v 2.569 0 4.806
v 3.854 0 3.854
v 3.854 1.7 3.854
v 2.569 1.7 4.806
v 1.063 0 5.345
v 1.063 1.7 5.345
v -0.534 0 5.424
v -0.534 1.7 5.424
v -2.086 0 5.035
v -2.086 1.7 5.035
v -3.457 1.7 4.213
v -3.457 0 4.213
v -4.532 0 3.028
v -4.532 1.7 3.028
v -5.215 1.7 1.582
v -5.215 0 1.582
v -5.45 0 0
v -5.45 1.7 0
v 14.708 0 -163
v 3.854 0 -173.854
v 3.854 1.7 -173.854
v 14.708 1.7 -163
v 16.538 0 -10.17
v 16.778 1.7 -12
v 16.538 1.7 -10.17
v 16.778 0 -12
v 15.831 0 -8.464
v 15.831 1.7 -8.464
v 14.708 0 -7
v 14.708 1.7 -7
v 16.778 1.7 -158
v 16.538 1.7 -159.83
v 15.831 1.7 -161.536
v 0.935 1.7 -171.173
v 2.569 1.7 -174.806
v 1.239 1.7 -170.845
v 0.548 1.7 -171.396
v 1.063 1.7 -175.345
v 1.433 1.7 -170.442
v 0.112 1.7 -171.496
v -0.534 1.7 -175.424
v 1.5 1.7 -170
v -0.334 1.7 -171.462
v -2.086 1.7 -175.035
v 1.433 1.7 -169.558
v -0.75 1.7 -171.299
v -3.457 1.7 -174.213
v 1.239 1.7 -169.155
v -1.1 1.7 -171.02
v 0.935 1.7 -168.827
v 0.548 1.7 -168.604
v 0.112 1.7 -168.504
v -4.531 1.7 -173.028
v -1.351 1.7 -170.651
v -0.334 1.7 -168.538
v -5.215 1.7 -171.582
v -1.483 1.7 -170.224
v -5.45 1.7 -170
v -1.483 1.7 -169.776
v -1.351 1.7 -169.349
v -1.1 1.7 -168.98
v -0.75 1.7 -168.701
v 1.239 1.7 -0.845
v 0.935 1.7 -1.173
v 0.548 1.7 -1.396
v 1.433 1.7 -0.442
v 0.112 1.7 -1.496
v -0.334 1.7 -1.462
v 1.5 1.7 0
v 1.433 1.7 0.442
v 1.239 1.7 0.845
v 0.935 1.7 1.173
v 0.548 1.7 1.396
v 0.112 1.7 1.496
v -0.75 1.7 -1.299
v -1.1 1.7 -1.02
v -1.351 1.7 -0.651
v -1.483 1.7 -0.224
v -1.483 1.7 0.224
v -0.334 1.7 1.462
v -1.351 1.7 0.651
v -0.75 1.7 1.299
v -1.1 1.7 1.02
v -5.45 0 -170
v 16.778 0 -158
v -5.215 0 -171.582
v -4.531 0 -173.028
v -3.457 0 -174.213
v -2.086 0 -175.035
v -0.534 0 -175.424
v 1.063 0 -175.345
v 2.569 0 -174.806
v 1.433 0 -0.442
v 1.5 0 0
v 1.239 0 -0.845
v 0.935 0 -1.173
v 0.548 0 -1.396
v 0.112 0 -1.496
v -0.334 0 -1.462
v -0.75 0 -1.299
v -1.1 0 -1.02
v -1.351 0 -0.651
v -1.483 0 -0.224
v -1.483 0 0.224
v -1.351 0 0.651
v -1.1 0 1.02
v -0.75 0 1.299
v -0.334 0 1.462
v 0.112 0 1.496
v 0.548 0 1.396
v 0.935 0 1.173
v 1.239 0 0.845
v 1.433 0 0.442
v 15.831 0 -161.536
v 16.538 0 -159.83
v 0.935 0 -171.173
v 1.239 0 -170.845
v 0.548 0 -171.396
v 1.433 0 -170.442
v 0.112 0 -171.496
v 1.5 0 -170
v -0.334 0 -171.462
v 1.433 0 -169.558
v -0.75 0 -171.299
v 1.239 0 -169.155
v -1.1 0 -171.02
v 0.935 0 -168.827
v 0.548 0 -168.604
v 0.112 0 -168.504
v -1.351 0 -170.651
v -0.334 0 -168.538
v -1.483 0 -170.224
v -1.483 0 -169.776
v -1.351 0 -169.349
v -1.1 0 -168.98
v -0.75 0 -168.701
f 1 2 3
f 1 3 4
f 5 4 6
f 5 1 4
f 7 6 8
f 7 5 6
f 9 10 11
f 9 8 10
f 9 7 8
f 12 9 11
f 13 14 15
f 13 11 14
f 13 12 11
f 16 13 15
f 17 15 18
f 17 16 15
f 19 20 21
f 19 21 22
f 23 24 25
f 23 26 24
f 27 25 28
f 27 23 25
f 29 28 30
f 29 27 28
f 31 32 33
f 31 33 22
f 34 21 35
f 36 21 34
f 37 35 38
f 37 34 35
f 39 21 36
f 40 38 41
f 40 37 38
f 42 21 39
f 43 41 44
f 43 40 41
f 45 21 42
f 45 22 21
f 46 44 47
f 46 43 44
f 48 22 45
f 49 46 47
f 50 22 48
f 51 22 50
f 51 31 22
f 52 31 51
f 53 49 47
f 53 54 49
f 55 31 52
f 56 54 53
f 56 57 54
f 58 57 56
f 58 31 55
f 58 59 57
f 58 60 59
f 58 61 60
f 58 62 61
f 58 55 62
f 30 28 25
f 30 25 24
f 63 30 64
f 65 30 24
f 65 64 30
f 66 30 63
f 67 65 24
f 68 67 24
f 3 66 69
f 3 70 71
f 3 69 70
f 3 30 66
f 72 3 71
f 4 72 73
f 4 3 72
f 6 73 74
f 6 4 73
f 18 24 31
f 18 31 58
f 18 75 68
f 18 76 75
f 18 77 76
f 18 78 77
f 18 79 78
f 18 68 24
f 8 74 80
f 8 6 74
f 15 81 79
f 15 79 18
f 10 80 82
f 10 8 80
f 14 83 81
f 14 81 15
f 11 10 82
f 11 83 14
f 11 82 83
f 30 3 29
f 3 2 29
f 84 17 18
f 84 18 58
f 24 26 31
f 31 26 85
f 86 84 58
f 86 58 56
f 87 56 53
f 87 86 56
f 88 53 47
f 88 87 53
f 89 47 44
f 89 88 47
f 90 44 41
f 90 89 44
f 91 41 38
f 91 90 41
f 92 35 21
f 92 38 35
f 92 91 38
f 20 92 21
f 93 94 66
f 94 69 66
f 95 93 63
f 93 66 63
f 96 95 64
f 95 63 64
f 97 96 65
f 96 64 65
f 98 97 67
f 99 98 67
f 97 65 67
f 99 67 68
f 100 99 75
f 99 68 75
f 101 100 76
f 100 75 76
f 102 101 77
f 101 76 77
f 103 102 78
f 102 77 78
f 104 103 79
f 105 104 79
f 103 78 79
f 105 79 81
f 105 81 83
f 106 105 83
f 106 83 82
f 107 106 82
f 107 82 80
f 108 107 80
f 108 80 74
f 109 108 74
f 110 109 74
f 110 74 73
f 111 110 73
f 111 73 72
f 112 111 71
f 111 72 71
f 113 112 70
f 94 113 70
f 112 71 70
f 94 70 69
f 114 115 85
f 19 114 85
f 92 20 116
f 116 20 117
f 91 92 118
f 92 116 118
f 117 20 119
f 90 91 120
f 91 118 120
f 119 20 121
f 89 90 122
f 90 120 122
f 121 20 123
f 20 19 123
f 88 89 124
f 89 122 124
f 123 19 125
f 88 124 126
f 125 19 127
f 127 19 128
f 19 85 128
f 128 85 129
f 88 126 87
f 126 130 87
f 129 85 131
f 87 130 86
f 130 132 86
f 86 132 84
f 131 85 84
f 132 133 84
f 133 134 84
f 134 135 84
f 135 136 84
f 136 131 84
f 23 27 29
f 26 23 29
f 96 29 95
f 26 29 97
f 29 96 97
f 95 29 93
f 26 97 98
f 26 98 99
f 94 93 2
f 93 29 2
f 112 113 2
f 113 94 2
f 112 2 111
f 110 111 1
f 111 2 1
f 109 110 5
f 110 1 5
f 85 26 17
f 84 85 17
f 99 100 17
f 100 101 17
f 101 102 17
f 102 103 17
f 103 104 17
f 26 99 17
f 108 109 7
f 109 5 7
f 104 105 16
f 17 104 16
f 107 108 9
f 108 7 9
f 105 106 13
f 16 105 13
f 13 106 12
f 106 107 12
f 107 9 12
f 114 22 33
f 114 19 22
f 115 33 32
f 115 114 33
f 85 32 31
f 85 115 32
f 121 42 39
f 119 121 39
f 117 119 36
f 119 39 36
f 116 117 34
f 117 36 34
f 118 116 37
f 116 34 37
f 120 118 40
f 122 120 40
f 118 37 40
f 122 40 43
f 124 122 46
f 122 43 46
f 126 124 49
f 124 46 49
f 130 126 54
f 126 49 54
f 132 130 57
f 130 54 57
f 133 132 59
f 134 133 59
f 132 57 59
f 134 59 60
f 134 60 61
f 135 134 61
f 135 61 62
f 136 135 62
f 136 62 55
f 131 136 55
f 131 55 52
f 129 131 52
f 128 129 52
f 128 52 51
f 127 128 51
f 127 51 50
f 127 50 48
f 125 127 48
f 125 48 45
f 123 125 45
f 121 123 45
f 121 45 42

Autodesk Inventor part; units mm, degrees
ref_plane "YZ Plane" through (0, 0, 0) normal (1, 0, 0) x (0, 1, 0)
ref_plane "XZ Plane" through (0, 0, 0) normal (0, 1, 0) x (-1, 0, 0)
ref_plane "XY Plane" through (0, 0, 0) normal (0, 0, 1) x (1, 0, 0)
sketch "Sketch1" plane through (0, 0, 0) normal (0, 1, 0) x (-1, 0, 0)
  arc A0 (5.45, 0) -> (-3.8537, 3.8537) centre (0, 0) ccw
  line L0 (5.45, 0) -> (5.45, -170)
  line L1 (-3.8537, 3.8537) -> (-14.7075, -7)
  arc A1 (-14.7075, -7) -> (-16.7785, -12) centre (-9.7075, -12) ccw
  line L2 (-16.7785, -12) -> (-16.7785, -158)
  arc A2 (-3.8537, -173.8537) -> (5.45, -170) centre (0, -170) ccw
  line L3 (-3.8537, -173.8537) -> (-14.7075, -163)
  arc A3 (-16.7785, -158) -> (-14.7075, -163) centre (-9.7075, -158) ccw
  dimension "d0" = 10.9
  dimension "d3" = 170
  dimension "d5" = 0
  dimension "d6" = 12
  dimension "d7" = 12
  dimension "d8" = 5.45
  dimension "d9" = 45
  dimension "d10" = 7
  dimension "d11" = 7
  dimension "d12" = 10.9
  dimension "d13" = 135
extrude "Extrusion1" add sketch "Sketch1" along normal blind 1.7
sketch "Sketch2" plane through (0, 1.7, 0) normal (0, 1, 0) x (1, 0, 0)
  arc A0 (3.8537, 173.8537) -> (-5.45, 170) centre (0, 170) ccw projected
  arc A1 (-5.45, 0) -> (3.8537, -3.8537) centre (0, 0) ccw projected
  circle A2 centre (0, 0) radius 1.5
  circle A3 centre (0, 170) radius 1.5
  dimension "d16" = 3
  dimension "d17" = 3
extrude "Extrusion2" cut sketch "Sketch2" against normal blind 1.7
equation "\"BendRadius\" = Thickness"
equation "\"BendReliefWidth\" = Thickness"
equation "\"BendReliefDepth\" = 0.5 * Thickness"
equation "\"CornerReliefSize\" = 4 * Thickness"
equation "\"MinimumRemnant\" = 2 * Thickness"
equation "\"TransitionRadius\" = BendRadius"
equation "\"JacobiRadiusSize\" = BendRadius"
equation "\"GapSize\" = Thickness"
equation "\"Thickness\" = 3.048"
properties part number "A3P2"
